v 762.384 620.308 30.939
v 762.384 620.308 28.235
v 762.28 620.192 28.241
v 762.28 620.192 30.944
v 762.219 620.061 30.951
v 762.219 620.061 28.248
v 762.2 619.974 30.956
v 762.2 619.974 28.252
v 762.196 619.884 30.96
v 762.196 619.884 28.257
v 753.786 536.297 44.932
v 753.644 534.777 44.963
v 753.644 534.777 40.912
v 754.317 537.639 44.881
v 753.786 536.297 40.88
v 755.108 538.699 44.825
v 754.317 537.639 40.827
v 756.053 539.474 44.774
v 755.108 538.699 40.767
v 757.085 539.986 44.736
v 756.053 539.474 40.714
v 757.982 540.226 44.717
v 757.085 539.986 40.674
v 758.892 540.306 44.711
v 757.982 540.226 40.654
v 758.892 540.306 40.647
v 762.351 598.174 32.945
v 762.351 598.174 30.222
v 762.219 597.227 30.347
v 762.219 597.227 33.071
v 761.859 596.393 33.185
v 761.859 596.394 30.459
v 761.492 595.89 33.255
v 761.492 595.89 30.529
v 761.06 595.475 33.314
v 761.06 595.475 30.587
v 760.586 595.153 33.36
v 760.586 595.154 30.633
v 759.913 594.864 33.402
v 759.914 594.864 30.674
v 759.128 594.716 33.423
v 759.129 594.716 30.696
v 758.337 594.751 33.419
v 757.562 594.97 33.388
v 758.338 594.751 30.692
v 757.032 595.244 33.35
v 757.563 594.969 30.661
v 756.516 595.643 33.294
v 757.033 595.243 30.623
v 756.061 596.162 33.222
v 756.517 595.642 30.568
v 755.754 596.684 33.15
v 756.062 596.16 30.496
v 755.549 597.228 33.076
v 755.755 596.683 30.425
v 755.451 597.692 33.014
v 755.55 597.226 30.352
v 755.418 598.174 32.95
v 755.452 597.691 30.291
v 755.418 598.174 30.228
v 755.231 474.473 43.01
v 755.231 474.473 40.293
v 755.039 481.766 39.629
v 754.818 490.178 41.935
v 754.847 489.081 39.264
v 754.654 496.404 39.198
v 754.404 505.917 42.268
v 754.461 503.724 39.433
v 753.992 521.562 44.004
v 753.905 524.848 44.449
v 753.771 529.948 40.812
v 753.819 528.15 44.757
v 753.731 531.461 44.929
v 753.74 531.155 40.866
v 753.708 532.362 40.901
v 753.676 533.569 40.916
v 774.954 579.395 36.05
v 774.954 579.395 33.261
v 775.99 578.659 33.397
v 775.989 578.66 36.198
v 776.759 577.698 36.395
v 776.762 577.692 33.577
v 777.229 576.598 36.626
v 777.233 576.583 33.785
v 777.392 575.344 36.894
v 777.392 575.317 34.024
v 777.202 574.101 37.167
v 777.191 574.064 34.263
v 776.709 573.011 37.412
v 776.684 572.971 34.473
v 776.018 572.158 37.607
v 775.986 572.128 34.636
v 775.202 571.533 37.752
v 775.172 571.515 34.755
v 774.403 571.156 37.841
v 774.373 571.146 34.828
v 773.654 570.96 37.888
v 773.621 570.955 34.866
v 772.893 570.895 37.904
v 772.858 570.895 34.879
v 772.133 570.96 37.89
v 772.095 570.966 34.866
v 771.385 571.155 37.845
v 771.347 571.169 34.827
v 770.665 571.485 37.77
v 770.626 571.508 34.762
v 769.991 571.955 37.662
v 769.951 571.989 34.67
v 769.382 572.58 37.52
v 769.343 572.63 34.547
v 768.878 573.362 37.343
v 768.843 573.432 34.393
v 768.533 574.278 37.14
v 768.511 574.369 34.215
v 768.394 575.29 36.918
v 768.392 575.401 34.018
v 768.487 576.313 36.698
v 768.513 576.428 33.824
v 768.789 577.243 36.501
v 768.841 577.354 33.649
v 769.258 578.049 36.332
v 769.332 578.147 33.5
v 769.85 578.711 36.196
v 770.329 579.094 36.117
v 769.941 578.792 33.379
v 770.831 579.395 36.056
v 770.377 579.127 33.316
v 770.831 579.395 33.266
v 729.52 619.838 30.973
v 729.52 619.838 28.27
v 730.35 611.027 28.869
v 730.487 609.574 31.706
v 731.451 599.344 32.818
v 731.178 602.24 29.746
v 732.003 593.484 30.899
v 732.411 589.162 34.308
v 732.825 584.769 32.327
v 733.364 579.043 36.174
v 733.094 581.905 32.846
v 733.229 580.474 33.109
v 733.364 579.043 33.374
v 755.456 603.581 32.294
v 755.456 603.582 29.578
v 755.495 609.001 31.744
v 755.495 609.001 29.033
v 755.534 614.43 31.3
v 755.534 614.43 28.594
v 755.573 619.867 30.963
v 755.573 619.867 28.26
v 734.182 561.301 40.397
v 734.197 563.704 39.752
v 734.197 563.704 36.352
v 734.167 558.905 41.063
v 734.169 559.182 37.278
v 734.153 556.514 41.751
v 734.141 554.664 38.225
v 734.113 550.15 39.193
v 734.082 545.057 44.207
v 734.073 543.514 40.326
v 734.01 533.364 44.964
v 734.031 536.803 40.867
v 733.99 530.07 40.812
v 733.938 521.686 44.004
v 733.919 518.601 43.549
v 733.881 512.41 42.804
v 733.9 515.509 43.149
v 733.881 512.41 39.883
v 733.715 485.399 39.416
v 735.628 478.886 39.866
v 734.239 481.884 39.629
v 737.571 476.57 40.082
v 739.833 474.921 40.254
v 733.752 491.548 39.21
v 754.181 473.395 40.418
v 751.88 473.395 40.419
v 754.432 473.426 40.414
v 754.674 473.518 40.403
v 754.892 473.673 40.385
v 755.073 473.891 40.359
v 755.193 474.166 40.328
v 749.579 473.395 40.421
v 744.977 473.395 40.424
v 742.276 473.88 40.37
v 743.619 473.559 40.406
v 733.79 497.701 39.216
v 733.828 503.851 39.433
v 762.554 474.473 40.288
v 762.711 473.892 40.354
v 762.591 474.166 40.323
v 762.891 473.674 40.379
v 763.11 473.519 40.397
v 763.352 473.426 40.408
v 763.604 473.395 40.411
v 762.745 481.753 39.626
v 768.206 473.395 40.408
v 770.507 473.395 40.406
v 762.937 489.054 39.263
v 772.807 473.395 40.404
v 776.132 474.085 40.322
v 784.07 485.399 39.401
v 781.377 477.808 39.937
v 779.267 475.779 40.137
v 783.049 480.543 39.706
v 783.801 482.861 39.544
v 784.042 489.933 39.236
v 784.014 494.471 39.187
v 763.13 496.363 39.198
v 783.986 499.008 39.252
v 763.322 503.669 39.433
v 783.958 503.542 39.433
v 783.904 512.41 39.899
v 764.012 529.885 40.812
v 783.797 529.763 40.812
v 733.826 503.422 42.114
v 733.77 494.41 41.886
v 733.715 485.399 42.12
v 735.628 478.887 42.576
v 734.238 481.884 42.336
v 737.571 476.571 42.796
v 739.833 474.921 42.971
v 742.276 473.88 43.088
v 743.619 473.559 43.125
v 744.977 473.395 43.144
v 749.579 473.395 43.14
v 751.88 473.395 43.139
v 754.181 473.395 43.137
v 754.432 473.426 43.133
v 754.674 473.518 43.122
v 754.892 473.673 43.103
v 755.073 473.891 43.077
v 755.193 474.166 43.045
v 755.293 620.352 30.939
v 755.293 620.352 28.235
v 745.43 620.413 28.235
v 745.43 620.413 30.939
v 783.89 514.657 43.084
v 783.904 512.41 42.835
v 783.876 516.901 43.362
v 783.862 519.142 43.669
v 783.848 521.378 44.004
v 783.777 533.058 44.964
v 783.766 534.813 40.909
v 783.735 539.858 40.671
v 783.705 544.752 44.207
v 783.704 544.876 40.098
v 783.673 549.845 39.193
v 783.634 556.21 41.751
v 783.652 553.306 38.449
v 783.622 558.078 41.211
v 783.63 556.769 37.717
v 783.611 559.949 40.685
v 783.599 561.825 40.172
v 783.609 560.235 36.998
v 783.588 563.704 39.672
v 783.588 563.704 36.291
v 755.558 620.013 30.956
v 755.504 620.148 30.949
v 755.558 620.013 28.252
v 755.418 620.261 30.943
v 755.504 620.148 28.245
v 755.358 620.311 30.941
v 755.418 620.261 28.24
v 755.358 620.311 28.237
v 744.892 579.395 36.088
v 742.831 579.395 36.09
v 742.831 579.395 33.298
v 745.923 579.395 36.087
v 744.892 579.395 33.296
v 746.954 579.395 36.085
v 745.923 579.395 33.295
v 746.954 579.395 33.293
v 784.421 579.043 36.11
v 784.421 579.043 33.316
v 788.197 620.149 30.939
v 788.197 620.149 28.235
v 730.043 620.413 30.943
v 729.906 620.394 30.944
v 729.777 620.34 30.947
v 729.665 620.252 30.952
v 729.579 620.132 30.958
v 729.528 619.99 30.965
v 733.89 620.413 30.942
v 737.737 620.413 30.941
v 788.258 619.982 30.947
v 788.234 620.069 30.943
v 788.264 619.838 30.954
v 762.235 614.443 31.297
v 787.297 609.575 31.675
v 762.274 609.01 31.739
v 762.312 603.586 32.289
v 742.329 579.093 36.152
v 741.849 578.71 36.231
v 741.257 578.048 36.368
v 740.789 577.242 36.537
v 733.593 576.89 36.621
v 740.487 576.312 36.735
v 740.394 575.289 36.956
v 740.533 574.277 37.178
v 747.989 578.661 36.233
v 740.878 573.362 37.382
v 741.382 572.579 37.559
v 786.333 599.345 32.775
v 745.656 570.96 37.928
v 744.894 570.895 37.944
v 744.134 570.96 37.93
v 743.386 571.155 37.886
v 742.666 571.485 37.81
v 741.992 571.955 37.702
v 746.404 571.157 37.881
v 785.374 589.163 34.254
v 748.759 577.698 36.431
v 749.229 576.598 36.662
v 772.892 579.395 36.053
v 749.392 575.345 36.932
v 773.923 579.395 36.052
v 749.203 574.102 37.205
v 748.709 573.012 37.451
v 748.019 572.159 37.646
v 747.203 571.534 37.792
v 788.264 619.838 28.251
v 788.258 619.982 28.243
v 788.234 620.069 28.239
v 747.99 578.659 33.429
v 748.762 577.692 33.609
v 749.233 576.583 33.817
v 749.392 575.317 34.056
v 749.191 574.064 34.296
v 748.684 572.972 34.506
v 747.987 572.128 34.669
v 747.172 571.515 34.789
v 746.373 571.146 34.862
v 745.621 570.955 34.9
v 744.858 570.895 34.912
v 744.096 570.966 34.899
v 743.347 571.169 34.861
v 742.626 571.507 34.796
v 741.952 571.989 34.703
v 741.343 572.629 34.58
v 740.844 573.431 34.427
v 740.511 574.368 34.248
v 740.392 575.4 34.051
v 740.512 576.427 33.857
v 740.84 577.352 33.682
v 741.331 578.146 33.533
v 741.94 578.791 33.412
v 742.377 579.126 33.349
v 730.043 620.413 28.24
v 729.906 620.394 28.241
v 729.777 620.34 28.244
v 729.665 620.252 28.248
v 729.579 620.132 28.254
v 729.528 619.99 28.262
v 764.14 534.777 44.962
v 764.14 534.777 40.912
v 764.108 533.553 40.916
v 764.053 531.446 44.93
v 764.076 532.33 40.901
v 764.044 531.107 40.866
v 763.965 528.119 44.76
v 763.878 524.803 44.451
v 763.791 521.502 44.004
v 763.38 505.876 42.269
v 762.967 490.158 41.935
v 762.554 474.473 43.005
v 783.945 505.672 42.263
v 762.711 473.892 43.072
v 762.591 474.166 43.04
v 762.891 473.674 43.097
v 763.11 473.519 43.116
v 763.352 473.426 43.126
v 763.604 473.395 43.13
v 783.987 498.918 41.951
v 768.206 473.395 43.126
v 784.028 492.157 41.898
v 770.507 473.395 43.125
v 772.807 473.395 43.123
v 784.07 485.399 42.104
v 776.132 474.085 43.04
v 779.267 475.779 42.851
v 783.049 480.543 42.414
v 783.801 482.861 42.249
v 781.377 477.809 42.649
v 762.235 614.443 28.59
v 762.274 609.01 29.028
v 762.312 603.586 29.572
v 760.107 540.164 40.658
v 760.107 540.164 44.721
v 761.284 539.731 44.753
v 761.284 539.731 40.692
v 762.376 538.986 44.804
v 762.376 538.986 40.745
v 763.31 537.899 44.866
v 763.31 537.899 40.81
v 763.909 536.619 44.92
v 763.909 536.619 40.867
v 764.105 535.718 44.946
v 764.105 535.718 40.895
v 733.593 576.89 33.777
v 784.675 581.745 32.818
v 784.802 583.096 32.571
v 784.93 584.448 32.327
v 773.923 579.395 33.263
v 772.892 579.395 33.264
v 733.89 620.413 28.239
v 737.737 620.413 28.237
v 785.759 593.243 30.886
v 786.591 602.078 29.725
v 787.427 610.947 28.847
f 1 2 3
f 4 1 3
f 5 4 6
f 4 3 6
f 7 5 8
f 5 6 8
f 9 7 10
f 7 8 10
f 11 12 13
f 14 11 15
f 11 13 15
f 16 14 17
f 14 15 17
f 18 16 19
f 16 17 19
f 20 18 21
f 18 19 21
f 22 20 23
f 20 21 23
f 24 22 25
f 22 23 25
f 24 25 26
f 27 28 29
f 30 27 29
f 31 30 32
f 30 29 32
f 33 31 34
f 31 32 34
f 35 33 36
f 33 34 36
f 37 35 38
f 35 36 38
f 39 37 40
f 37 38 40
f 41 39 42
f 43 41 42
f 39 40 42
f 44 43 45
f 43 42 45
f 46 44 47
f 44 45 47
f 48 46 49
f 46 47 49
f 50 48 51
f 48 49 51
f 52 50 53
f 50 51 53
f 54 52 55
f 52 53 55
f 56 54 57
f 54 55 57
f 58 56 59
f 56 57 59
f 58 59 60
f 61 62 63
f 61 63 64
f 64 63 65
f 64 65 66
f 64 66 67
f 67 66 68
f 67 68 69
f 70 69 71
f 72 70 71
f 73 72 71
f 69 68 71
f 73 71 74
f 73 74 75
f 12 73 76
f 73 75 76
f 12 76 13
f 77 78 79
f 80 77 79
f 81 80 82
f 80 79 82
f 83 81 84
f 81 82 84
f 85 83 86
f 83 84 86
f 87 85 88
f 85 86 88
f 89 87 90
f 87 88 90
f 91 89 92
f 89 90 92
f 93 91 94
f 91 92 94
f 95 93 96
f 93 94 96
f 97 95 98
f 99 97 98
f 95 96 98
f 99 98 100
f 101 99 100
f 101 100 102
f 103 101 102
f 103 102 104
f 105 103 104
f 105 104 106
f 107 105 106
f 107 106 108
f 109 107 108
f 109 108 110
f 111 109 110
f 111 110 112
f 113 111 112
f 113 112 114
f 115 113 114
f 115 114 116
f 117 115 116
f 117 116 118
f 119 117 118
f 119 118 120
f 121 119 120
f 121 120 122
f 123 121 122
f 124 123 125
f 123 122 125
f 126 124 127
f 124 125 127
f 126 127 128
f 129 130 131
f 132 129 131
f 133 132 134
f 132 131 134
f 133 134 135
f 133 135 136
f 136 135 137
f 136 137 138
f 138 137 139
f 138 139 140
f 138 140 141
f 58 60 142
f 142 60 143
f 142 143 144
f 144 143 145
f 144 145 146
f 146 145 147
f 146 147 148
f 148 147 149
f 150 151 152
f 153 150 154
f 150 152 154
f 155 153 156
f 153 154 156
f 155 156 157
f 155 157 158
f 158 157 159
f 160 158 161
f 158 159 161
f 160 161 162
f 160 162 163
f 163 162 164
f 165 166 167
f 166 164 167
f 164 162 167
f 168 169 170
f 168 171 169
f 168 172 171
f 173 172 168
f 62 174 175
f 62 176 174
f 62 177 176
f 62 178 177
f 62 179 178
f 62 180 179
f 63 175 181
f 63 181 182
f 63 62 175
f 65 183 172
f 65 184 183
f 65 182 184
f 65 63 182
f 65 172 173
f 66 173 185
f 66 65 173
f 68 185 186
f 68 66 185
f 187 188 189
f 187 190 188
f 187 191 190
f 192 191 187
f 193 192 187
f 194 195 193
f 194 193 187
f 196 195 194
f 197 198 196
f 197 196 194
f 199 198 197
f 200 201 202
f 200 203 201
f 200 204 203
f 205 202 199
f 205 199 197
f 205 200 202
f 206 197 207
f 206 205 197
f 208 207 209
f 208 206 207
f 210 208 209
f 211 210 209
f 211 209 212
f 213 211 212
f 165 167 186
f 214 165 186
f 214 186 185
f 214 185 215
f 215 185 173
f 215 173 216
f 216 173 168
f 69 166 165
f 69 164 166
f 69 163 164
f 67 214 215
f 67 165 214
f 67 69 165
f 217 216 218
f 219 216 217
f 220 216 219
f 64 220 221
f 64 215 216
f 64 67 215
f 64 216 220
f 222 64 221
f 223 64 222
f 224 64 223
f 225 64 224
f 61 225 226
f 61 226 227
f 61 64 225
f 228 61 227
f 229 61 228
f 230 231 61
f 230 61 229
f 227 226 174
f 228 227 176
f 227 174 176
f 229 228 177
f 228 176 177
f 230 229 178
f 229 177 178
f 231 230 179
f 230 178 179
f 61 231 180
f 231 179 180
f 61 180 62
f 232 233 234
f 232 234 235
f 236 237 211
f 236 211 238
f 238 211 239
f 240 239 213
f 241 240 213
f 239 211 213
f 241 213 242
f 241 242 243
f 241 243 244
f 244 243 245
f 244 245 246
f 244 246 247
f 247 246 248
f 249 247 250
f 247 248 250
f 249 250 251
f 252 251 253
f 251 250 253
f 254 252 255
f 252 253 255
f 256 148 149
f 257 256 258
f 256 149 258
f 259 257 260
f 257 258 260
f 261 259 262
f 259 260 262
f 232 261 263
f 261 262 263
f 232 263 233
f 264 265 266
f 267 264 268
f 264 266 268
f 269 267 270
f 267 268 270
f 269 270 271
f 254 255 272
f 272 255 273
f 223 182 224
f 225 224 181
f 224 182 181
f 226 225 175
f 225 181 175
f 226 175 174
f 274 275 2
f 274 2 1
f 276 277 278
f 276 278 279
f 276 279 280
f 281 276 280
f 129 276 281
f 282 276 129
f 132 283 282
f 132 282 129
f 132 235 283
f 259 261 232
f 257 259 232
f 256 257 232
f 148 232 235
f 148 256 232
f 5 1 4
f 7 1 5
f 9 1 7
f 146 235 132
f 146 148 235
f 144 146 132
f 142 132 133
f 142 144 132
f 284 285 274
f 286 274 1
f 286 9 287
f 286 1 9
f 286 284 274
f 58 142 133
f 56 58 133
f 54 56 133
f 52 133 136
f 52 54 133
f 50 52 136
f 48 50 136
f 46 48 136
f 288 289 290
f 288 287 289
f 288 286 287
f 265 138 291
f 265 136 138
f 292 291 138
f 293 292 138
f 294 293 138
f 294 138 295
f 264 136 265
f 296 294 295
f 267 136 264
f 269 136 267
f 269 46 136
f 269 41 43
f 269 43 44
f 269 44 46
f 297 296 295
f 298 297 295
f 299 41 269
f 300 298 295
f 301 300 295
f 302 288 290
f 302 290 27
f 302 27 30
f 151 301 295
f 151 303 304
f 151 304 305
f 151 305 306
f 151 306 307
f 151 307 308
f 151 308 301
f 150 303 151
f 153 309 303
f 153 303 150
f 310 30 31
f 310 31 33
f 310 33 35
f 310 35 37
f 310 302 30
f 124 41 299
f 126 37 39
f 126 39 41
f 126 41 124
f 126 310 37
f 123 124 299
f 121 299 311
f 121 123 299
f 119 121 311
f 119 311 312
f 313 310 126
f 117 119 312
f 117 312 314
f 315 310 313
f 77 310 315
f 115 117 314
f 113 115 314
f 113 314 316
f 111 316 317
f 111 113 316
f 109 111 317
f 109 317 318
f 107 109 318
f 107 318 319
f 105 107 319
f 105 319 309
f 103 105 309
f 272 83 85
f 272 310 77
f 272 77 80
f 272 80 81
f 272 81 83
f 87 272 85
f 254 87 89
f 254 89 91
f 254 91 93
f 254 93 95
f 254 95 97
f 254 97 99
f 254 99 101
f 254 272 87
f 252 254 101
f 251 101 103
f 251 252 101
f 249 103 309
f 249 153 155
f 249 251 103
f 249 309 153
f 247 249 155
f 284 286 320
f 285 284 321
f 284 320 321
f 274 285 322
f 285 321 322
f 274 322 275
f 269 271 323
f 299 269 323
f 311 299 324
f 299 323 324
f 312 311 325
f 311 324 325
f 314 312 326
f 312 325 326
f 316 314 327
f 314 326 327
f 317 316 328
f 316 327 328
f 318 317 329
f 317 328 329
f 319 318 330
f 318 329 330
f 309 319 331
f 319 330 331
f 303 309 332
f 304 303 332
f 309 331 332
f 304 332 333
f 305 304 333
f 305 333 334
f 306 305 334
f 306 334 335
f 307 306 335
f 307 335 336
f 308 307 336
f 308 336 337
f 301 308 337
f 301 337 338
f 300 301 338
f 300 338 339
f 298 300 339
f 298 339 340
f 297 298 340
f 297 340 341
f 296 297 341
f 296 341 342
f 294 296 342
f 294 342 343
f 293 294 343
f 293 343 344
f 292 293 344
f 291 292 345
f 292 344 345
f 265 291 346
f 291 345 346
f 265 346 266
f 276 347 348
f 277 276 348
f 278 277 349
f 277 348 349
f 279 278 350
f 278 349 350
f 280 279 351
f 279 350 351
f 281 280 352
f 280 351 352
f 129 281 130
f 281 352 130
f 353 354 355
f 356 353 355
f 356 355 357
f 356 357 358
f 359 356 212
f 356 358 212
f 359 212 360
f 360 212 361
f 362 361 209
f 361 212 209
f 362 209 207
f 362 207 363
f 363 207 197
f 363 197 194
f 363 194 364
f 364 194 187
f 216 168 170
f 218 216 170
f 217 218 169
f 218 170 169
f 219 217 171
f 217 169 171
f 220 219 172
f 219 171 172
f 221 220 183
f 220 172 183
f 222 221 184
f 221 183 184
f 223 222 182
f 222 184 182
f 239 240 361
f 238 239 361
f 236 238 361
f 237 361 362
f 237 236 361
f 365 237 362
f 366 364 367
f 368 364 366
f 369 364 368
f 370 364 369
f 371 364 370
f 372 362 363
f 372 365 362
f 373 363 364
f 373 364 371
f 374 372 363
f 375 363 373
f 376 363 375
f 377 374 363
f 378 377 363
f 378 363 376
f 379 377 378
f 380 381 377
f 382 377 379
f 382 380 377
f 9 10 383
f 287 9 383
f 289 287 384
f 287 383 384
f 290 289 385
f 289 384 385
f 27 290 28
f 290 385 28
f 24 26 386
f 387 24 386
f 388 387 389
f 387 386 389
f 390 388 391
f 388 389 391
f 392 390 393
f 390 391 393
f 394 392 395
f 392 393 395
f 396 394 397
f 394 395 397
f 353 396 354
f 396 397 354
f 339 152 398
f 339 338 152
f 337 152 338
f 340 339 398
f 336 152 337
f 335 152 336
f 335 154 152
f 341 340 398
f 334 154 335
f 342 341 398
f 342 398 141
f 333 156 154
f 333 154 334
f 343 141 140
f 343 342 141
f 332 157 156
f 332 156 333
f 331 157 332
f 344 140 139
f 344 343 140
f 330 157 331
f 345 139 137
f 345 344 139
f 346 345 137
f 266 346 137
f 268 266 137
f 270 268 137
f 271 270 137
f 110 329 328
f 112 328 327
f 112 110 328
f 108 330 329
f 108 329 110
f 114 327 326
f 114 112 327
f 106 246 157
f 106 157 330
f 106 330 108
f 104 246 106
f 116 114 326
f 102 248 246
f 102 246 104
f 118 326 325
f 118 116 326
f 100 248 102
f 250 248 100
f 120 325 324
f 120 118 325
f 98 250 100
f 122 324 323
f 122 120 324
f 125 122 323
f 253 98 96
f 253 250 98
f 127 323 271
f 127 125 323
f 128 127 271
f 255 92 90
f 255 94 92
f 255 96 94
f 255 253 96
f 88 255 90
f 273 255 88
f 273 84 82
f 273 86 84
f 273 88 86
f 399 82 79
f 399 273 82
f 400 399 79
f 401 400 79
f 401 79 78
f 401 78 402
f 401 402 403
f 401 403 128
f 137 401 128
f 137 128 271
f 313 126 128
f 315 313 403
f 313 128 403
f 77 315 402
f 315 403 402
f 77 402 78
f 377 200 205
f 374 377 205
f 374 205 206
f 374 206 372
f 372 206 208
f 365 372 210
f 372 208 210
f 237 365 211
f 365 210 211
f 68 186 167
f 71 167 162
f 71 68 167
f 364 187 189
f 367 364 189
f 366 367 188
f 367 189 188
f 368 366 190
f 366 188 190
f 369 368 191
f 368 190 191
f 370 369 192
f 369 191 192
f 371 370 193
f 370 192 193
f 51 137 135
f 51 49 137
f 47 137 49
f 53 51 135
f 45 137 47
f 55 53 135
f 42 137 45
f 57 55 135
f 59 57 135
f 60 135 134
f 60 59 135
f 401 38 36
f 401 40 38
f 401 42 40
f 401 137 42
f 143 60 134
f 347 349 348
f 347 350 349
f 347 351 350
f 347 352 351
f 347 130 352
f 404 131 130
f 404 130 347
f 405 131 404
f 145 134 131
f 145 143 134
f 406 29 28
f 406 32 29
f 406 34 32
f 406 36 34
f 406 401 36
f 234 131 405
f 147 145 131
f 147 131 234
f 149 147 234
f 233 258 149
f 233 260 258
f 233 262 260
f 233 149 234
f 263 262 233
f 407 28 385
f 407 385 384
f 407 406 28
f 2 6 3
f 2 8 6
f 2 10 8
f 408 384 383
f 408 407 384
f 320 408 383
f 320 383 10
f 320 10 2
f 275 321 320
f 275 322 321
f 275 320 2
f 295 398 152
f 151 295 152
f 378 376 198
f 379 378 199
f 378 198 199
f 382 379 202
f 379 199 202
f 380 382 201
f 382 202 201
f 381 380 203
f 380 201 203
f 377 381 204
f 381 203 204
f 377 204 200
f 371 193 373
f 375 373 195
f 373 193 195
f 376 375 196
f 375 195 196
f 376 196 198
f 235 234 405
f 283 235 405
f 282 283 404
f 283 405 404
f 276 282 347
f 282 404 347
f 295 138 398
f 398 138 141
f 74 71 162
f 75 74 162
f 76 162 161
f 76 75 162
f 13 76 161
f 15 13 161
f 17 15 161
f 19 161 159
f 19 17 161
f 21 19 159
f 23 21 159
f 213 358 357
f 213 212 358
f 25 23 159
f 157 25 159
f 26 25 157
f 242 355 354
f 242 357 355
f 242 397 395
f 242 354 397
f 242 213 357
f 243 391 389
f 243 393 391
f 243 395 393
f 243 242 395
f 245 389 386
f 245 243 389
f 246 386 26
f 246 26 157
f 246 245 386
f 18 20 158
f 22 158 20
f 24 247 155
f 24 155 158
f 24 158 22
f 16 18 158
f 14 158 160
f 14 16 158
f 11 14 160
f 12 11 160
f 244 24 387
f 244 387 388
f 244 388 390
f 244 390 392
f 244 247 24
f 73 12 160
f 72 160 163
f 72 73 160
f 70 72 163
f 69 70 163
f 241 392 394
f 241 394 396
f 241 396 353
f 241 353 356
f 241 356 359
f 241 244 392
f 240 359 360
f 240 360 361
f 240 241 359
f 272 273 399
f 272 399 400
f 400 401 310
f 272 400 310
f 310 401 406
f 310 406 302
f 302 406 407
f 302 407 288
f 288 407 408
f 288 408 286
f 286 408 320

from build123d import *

# Parameters (mm, degrees)
BOSS_EXTRUDE1_DEPTH     = 92
CUT_EXTRUDE1_DEPTH      = 79
CUT_EXTRUDE1_DEPTH_BACK = 118
SKETCH3_OUTSIDE_W       = 130.624
SKETCH3_OUTSIDE_H       = 186.018
CUT_EXTRUDE2_DEPTH      = 81


with BuildPart() as part:
    # Sketch2 → Boss-Extrude1 (new body)
    with BuildSketch(Plane.XY):
        with BuildLine():
            Line((733.88097227, 512.409540482), (733.714590272, 485.398634247))
            ThreePointArc((733.714590272, 485.398634247), (736.969847934, 477.167503112), (744.977198909, 473.39516265))
            Line((744.977198909, 473.39516265), (754.180697278, 473.39516265))
            ThreePointArc((754.180697278, 473.39516265), (754.93321765, 473.712680398), (755.230833309, 474.473291567))
            Line((755.230833309, 474.473291567), (753.644223799, 534.77684994))
            ThreePointArc((753.644223799, 534.77684994), (755.079973826, 538.669205509), (758.892348589, 540.305545534))
            ThreePointArc((758.892348589, 540.305545534), (762.704723352, 538.669205509), (764.140473379, 534.77684994))
            Line((764.140473379, 534.77684994), (762.553863869, 474.473291567))
            ThreePointArc((762.553863869, 474.473291567), (762.851479527, 473.712680398), (763.6039999, 473.39516265))
            Line((763.6039999, 473.39516265), (772.807498269, 473.39516265))
            ThreePointArc((772.807498269, 473.39516265), (780.815918514, 477.166499838), (784.070106906, 485.398634247))
            Line((784.070106906, 485.398634247), (783.903724908, 512.409540482))
            Line((783.903724908, 512.409540482), (783.587761623, 563.703879936))
            ThreePointArc((783.587761623, 563.703879936), (783.77247461, 571.386020865), (784.420563352, 579.043003895))
            Line((784.420563352, 579.043003895), (788.264414586, 619.838080174))
            ThreePointArc((788.264414586, 619.838080174), (788.129918742, 620.240910995), (787.741481052, 620.412602475))
            Line((787.741481052, 620.412602475), (763.947048131, 620.430206642))
            Line((763.947048131, 620.430206642), (762.720599723, 620.430206642))
            ThreePointArc((762.720599723, 620.430206642), (762.341943379, 620.26897154), (762.195758152, 619.884254418))
            Line((762.195758152, 619.884254418), (762.351012345, 598.173946788))
            ThreePointArc((762.351012345, 598.173946788), (758.884364195, 594.707298638), (755.417716045, 598.173946788))
            Line((755.417716045, 598.173946788), (755.572970238, 619.86665025))
            ThreePointArc((755.572970238, 619.86665025), (755.426785011, 620.251367372), (755.048128667, 620.412602475))
            Line((755.048128667, 620.412602475), (753.837649047, 620.412602475))
            Line((753.837649047, 620.412602475), (730.043216126, 620.412602475))
            ThreePointArc((730.043216126, 620.412602475), (729.654778436, 620.240910995), (729.520282592, 619.838080174))
            Line((729.520282592, 619.838080174), (733.364133826, 579.043003895))
            ThreePointArc((733.364133826, 579.043003895), (733.483379901, 577.967121369), (733.593469282, 576.890263363))
            ThreePointArc((733.593469282, 576.890263363), (734.066308334, 570.3049022), (734.196935555, 563.703879936))
            Line((734.196935555, 563.703879936), (733.88097227, 512.409540482))
        make_face()
    extrude(amount=BOSS_EXTRUDE1_DEPTH)

    # Sketch3 outside → Cut-Extrude1 (cut, two sides: drawn at the far end of the back side and taken through both)
    with BuildSketch(Plane(origin=(730.696902853, -4.500952665, 0), x_dir=(0, 0, 1), z_dir=(-0.9999810289222565, 0.006159691192376741, 0)).offset(-CUT_EXTRUDE1_DEPTH_BACK)):
        with Locations((46, 551.577)):
            Rectangle(SKETCH3_OUTSIDE_W, SKETCH3_OUTSIDE_H)
        with BuildLine():
            Line((43.143604537, 477.975011324), (40.424473775, 477.975011324))
            ThreePointArc((40.424473775, 477.975011324), (39.281332513, 493.147025466), (39.432951406, 508.361288404))
            Line((39.432951406, 508.361288404), (40.812056524, 534.581043725))
            ThreePointArc((40.812056524, 534.581043725), (40.67113948, 544.675291647), (39.192711885, 554.661679912))
            ThreePointArc((39.192711885, 554.661679912), (35.60695145, 571.936620339), (32.326521857, 589.272133783))
            ThreePointArc((32.326521857, 589.272133783), (29.707708403, 607.06664821), (28.235119991, 624.992451149))
            Line((28.235119991, 624.992451149), (30.938516025, 624.992451149))
            ThreePointArc((30.938516025, 624.992451149), (34.470259418, 592.692390498), (41.750655625, 561.025957788))
            ThreePointArc((41.750655625, 561.025957788), (44.799963896, 543.735773309), (44.004202882, 526.196801712))
            ThreePointArc((44.004202882, 526.196801712), (41.914294104, 502.115525022), (43.143604537, 477.975011324))
        make_face(mode=Mode.SUBTRACT)
    extrude(amount=CUT_EXTRUDE1_DEPTH + CUT_EXTRUDE1_DEPTH_BACK, mode=Mode.SUBTRACT)

    # Sketch4 → Cut-Extrude2 (cut)
    with BuildSketch(Plane.XY):
        with BuildLine():
            Line((770.830795776, 579.39516265), (774.953901402, 579.39516265))
            ThreePointArc((774.953901402, 579.39516265), (772.892348589, 570.89516265), (770.830795776, 579.39516265))
        make_face()
        with BuildLine():
            Line((742.830795776, 579.39516265), (746.953901402, 579.39516265))
            ThreePointArc((746.953901402, 579.39516265), (744.892348589, 570.89516265), (742.830795776, 579.39516265))
        make_face()
    extrude(amount=CUT_EXTRUDE2_DEPTH, mode=Mode.SUBTRACT)


solid = part.part
